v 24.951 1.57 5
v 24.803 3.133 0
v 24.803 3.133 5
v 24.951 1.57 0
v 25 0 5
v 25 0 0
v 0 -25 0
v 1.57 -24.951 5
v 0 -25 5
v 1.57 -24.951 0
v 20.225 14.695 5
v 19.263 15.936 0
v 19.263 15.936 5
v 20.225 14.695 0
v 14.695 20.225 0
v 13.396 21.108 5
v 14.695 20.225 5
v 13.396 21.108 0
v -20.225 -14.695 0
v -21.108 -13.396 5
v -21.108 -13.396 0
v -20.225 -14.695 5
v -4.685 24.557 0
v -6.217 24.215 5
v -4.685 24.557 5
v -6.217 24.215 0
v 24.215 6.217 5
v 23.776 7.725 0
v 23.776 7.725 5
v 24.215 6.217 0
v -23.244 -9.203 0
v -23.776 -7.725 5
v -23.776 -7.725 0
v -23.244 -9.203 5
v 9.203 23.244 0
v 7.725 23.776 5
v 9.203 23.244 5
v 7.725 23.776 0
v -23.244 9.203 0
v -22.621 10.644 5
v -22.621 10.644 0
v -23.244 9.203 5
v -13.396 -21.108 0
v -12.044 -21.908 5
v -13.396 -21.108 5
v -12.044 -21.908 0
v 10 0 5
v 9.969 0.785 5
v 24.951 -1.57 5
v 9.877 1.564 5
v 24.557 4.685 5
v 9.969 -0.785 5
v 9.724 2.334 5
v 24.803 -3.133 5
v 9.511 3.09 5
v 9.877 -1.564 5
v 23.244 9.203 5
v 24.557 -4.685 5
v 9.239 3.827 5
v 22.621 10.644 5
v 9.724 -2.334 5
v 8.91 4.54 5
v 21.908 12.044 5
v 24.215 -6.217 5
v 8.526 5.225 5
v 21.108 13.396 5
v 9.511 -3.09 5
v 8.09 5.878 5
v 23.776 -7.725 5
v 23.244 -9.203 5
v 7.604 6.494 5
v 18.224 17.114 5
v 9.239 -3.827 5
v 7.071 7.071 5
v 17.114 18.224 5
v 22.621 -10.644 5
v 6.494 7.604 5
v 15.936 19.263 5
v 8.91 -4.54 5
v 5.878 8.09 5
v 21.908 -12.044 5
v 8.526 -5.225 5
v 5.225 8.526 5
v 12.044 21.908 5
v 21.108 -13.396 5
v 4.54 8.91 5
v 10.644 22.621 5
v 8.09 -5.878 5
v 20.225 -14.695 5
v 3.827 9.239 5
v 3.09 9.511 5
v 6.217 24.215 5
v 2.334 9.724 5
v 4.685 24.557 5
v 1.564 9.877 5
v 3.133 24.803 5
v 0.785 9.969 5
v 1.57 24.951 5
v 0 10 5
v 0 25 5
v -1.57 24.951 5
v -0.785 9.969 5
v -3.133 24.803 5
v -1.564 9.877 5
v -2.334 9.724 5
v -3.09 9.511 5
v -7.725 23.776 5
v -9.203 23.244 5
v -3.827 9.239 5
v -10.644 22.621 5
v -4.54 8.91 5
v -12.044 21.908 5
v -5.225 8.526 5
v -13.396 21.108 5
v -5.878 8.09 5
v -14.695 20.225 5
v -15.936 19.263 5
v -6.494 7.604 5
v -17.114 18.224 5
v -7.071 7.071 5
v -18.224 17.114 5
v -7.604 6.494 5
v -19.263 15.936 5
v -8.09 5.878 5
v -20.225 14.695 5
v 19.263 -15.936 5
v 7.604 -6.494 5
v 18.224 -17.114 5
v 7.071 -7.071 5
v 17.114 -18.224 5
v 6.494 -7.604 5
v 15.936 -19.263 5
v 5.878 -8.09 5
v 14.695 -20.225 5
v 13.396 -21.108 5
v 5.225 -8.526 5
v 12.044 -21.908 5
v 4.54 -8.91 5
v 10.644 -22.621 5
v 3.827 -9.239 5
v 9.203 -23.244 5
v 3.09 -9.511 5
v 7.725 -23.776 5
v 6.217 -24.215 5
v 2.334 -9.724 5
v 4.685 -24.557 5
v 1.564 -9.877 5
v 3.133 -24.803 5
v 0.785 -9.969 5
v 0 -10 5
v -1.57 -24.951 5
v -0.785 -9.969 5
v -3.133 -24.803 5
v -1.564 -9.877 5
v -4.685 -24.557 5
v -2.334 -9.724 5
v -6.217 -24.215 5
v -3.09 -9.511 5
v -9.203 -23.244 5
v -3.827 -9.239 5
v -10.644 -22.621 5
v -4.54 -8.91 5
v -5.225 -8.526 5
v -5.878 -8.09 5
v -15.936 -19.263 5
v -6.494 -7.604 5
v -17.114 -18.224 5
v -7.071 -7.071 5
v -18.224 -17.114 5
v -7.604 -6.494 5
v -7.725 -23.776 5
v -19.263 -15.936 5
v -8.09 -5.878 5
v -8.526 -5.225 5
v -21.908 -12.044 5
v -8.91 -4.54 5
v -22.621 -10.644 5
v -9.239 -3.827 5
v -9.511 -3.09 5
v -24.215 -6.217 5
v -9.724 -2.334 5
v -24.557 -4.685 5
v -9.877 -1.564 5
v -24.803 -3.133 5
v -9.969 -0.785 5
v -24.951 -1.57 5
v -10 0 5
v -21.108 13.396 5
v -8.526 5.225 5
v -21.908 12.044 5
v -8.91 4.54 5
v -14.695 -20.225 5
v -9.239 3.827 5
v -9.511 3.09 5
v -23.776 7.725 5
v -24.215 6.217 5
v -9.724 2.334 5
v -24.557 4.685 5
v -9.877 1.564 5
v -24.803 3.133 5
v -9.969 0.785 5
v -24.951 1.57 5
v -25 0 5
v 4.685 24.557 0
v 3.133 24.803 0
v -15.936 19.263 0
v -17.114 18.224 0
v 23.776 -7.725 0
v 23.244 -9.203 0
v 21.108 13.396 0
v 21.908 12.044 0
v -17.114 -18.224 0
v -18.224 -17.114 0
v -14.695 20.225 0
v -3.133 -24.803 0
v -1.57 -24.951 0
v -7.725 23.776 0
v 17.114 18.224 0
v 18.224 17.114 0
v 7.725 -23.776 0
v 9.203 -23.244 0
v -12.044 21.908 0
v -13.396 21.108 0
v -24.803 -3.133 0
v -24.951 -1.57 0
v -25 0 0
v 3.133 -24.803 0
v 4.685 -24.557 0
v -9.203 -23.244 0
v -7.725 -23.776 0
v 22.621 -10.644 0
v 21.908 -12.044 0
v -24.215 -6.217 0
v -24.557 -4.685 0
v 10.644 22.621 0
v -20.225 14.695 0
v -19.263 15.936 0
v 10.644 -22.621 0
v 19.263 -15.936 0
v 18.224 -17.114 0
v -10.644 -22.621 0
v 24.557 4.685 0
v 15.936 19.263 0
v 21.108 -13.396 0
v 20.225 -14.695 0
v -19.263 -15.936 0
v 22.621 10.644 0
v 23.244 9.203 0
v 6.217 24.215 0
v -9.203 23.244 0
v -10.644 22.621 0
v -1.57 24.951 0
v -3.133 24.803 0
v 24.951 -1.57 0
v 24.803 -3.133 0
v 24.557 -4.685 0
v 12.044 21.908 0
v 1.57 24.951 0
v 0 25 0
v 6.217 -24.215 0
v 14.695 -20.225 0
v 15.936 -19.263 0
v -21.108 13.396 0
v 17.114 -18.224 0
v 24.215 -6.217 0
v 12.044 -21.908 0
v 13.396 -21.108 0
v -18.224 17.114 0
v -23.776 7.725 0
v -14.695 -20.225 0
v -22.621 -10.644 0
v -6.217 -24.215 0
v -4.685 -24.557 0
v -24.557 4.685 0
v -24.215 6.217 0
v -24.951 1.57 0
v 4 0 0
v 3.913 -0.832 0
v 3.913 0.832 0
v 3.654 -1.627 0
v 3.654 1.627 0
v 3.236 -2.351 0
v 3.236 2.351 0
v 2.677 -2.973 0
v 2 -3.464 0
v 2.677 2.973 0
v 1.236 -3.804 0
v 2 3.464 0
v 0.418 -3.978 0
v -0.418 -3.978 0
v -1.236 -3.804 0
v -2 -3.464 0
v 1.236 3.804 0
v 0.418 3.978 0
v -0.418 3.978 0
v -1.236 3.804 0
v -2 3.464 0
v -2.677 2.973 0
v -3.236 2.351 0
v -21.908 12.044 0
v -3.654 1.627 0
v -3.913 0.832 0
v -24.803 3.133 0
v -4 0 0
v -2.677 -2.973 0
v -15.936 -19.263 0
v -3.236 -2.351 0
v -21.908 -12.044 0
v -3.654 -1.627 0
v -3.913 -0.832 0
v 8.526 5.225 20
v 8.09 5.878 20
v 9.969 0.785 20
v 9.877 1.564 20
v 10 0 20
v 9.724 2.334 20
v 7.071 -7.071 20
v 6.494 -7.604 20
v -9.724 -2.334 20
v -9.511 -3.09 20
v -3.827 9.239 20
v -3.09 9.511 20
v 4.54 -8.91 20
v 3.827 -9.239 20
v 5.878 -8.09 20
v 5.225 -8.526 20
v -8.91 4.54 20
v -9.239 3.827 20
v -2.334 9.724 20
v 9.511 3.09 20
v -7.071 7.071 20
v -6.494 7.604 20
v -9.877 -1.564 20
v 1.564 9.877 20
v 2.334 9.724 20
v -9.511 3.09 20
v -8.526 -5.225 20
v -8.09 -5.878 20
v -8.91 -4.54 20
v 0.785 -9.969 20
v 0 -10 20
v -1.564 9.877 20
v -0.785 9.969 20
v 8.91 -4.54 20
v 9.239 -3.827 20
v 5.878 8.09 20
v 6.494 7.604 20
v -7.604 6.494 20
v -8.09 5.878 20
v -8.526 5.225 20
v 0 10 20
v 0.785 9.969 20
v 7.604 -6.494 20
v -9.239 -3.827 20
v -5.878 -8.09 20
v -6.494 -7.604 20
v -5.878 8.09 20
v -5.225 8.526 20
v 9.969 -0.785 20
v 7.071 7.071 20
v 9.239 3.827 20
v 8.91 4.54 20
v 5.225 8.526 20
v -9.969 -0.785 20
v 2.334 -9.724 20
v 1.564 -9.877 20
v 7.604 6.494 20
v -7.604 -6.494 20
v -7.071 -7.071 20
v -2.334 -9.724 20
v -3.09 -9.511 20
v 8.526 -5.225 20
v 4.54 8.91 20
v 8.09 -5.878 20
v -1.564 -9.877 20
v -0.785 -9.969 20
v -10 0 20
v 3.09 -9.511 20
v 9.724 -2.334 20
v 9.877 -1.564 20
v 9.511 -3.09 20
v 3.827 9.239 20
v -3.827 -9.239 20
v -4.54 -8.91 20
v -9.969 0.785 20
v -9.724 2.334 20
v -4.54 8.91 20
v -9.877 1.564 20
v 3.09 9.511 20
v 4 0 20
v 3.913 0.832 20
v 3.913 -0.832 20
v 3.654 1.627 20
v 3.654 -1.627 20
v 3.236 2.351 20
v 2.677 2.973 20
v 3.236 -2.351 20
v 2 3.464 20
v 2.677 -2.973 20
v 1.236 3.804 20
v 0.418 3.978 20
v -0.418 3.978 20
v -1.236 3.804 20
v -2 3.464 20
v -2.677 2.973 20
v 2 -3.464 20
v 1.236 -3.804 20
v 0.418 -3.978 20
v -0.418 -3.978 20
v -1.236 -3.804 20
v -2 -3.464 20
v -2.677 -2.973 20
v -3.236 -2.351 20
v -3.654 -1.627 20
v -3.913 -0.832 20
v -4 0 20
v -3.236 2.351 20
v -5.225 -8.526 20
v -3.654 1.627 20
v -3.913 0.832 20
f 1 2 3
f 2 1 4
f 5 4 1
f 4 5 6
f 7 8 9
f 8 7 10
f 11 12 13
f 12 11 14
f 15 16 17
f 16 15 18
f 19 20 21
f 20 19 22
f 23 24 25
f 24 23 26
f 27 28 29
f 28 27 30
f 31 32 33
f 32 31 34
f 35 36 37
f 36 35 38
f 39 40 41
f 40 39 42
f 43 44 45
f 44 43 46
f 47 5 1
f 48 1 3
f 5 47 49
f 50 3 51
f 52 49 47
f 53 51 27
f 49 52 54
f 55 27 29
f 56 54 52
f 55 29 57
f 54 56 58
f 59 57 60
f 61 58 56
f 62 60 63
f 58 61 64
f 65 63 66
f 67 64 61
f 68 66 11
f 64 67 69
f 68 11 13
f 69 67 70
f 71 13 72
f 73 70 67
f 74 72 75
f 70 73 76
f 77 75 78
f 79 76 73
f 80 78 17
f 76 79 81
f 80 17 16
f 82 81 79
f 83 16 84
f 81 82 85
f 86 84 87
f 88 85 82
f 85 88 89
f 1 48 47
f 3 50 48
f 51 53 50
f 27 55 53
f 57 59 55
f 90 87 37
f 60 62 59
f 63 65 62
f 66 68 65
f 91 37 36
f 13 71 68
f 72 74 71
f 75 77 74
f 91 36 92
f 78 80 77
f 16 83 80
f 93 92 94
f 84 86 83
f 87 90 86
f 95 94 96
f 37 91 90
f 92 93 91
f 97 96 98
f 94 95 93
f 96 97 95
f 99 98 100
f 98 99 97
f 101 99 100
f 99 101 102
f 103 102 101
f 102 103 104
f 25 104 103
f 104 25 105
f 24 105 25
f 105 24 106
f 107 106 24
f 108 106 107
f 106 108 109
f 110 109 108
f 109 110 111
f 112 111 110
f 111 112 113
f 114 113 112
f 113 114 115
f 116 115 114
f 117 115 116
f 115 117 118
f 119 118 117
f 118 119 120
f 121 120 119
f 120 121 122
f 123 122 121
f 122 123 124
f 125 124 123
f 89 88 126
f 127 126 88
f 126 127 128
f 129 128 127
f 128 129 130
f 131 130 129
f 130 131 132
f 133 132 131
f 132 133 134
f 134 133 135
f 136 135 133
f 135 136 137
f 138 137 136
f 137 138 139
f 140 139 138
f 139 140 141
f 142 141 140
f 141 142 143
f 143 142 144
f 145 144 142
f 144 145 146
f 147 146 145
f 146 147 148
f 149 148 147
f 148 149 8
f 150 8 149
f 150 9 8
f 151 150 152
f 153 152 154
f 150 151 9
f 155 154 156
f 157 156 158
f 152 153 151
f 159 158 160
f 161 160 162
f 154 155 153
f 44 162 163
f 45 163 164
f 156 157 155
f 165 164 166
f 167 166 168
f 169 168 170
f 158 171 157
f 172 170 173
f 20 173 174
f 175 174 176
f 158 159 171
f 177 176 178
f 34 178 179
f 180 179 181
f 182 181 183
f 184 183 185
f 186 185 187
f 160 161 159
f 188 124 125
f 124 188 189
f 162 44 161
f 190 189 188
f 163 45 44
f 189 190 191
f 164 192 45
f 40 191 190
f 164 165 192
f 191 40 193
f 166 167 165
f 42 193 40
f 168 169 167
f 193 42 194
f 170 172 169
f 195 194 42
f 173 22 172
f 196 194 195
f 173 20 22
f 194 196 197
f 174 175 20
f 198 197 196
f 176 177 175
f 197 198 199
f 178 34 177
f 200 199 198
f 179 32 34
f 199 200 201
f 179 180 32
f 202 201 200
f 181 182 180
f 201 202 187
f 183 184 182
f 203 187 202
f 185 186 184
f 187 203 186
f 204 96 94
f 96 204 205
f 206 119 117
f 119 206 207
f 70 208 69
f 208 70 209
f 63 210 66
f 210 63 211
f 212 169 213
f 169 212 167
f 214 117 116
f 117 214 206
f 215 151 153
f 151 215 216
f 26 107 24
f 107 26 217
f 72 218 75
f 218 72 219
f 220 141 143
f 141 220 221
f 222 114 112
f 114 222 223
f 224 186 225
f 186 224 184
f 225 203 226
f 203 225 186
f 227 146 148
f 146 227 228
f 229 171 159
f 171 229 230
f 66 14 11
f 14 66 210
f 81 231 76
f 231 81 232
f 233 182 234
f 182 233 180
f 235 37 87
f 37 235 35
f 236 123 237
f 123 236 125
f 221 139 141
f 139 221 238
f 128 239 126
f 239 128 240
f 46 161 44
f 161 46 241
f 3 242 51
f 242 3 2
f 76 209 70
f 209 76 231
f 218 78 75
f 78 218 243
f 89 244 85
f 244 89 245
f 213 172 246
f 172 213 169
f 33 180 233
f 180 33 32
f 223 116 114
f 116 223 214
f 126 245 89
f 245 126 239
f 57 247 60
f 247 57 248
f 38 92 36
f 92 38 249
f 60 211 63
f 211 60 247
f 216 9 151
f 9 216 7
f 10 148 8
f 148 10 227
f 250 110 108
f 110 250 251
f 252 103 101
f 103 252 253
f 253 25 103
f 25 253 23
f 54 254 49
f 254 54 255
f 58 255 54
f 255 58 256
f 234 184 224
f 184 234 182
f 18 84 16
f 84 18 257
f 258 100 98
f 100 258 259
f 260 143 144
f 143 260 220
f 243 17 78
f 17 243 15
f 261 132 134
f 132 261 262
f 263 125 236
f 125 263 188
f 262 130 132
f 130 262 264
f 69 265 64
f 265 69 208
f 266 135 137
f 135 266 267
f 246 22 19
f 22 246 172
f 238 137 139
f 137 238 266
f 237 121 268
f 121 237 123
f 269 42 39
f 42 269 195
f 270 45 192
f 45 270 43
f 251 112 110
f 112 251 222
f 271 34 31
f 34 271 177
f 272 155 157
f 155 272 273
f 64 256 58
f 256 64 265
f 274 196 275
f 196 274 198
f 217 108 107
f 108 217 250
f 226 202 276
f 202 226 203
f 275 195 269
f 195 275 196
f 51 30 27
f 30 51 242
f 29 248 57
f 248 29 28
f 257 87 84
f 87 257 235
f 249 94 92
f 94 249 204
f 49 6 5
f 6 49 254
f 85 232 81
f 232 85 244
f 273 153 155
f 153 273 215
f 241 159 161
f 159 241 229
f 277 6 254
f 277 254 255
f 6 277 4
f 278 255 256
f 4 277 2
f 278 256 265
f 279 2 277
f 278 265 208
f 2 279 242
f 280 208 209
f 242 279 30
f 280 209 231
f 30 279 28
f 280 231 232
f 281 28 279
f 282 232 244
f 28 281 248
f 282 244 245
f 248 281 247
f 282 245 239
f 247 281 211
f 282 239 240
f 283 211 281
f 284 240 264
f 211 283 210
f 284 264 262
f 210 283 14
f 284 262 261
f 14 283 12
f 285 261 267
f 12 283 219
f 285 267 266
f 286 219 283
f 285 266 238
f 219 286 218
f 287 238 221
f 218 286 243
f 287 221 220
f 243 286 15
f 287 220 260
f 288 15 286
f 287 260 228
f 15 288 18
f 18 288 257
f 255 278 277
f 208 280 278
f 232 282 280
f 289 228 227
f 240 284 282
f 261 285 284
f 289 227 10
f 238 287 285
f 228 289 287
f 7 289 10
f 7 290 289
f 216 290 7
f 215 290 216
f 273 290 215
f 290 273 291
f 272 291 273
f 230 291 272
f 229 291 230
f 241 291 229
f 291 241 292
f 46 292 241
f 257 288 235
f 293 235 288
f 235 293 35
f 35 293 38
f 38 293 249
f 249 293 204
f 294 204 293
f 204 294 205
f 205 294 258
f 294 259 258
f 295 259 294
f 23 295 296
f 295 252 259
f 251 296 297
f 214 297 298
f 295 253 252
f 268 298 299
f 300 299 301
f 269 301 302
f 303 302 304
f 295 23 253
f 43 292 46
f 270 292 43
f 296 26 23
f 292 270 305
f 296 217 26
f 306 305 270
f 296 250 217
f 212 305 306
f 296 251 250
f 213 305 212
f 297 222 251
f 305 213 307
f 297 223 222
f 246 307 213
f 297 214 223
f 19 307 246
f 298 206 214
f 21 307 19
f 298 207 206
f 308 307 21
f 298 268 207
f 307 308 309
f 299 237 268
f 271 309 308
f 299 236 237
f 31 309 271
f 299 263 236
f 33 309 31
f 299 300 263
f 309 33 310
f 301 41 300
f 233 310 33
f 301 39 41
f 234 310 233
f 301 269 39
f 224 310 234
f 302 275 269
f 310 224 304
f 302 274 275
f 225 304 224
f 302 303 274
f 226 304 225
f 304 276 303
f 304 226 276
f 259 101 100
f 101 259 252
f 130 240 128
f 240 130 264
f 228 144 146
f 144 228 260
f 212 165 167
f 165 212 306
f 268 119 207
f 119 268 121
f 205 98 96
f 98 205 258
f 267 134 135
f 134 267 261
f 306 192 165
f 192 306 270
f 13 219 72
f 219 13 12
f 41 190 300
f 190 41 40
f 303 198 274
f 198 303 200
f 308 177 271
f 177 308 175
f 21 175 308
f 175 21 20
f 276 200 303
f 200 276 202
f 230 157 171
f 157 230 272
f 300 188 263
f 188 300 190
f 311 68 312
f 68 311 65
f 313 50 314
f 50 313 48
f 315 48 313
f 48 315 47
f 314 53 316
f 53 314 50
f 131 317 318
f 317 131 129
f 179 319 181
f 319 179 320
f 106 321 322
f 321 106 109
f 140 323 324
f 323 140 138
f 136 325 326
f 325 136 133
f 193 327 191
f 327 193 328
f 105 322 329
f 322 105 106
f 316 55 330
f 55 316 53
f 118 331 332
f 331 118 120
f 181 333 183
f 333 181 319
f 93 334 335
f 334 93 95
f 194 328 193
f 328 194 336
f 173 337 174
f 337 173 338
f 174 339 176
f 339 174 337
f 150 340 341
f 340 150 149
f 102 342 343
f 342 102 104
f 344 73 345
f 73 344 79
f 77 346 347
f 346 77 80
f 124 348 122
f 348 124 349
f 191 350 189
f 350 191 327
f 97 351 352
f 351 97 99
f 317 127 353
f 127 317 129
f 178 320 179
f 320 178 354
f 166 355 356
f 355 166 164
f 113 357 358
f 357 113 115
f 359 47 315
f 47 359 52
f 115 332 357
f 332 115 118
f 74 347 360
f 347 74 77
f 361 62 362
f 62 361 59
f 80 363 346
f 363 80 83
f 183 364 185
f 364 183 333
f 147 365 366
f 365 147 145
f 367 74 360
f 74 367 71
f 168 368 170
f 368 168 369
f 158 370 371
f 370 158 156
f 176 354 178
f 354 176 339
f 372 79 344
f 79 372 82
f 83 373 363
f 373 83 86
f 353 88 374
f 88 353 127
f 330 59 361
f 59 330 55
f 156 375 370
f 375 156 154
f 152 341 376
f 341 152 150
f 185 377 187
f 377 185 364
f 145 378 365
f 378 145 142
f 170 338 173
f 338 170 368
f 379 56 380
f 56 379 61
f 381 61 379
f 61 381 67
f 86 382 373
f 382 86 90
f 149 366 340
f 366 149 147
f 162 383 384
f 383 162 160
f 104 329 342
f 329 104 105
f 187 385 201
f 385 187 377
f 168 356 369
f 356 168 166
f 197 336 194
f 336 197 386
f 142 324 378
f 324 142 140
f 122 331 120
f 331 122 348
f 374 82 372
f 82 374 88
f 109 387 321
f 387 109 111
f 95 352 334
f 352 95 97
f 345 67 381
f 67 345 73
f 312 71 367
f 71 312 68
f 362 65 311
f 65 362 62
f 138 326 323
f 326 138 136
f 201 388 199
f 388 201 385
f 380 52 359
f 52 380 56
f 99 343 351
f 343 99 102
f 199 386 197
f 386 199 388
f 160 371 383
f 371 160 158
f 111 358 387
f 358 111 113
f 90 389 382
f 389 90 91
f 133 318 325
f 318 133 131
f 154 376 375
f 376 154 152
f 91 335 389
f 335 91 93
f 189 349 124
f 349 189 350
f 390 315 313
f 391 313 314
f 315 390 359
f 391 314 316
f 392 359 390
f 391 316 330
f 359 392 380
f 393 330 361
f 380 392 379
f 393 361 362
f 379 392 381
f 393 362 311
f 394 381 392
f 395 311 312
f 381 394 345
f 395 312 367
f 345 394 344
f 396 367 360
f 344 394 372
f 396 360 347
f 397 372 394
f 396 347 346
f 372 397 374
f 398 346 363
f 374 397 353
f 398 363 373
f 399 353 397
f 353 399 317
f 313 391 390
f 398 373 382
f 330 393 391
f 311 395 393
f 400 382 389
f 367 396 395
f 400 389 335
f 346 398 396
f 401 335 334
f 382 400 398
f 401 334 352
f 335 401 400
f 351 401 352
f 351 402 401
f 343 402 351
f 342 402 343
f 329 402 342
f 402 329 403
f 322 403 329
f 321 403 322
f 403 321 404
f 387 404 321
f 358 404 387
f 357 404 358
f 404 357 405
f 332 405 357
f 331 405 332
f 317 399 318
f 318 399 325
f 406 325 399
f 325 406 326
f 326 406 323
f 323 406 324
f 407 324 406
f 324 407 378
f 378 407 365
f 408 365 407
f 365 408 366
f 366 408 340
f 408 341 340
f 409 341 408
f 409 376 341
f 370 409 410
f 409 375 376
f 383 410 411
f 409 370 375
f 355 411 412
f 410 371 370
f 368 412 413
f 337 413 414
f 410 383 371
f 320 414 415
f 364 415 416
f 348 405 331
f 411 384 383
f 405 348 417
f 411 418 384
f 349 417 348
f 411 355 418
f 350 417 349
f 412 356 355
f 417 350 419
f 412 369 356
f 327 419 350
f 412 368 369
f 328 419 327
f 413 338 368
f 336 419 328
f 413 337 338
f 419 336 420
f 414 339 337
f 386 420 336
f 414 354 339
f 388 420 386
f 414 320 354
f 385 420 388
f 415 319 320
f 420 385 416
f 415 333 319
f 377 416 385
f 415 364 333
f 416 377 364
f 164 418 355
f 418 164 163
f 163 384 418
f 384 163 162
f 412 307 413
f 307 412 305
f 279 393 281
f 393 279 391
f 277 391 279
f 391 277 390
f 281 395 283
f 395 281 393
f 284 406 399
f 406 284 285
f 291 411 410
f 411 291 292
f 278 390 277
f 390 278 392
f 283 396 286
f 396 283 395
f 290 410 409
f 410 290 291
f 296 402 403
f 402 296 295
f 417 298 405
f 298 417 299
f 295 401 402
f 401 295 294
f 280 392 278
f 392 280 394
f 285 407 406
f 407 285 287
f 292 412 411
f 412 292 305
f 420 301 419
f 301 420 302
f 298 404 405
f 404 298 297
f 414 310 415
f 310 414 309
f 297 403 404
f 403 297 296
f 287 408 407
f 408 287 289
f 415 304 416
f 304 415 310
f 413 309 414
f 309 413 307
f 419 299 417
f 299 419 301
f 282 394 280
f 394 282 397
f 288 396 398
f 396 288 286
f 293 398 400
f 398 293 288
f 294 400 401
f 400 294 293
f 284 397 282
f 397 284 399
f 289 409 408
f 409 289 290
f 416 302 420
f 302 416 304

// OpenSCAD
//-- Rueda con portaejes y taladro para el eje
difference(){
    //-- Rueda
    union(){
        //-- Base de la rueda
        cylinder(r=50/2,h=5,$fn=100);
        //-- Portaejes
        cylinder(r=20/2,h=20,$fn=80);
    }
    //-- Taladro
    cylinder(r=8/2,h=80,$fn=30,center=true);
}
